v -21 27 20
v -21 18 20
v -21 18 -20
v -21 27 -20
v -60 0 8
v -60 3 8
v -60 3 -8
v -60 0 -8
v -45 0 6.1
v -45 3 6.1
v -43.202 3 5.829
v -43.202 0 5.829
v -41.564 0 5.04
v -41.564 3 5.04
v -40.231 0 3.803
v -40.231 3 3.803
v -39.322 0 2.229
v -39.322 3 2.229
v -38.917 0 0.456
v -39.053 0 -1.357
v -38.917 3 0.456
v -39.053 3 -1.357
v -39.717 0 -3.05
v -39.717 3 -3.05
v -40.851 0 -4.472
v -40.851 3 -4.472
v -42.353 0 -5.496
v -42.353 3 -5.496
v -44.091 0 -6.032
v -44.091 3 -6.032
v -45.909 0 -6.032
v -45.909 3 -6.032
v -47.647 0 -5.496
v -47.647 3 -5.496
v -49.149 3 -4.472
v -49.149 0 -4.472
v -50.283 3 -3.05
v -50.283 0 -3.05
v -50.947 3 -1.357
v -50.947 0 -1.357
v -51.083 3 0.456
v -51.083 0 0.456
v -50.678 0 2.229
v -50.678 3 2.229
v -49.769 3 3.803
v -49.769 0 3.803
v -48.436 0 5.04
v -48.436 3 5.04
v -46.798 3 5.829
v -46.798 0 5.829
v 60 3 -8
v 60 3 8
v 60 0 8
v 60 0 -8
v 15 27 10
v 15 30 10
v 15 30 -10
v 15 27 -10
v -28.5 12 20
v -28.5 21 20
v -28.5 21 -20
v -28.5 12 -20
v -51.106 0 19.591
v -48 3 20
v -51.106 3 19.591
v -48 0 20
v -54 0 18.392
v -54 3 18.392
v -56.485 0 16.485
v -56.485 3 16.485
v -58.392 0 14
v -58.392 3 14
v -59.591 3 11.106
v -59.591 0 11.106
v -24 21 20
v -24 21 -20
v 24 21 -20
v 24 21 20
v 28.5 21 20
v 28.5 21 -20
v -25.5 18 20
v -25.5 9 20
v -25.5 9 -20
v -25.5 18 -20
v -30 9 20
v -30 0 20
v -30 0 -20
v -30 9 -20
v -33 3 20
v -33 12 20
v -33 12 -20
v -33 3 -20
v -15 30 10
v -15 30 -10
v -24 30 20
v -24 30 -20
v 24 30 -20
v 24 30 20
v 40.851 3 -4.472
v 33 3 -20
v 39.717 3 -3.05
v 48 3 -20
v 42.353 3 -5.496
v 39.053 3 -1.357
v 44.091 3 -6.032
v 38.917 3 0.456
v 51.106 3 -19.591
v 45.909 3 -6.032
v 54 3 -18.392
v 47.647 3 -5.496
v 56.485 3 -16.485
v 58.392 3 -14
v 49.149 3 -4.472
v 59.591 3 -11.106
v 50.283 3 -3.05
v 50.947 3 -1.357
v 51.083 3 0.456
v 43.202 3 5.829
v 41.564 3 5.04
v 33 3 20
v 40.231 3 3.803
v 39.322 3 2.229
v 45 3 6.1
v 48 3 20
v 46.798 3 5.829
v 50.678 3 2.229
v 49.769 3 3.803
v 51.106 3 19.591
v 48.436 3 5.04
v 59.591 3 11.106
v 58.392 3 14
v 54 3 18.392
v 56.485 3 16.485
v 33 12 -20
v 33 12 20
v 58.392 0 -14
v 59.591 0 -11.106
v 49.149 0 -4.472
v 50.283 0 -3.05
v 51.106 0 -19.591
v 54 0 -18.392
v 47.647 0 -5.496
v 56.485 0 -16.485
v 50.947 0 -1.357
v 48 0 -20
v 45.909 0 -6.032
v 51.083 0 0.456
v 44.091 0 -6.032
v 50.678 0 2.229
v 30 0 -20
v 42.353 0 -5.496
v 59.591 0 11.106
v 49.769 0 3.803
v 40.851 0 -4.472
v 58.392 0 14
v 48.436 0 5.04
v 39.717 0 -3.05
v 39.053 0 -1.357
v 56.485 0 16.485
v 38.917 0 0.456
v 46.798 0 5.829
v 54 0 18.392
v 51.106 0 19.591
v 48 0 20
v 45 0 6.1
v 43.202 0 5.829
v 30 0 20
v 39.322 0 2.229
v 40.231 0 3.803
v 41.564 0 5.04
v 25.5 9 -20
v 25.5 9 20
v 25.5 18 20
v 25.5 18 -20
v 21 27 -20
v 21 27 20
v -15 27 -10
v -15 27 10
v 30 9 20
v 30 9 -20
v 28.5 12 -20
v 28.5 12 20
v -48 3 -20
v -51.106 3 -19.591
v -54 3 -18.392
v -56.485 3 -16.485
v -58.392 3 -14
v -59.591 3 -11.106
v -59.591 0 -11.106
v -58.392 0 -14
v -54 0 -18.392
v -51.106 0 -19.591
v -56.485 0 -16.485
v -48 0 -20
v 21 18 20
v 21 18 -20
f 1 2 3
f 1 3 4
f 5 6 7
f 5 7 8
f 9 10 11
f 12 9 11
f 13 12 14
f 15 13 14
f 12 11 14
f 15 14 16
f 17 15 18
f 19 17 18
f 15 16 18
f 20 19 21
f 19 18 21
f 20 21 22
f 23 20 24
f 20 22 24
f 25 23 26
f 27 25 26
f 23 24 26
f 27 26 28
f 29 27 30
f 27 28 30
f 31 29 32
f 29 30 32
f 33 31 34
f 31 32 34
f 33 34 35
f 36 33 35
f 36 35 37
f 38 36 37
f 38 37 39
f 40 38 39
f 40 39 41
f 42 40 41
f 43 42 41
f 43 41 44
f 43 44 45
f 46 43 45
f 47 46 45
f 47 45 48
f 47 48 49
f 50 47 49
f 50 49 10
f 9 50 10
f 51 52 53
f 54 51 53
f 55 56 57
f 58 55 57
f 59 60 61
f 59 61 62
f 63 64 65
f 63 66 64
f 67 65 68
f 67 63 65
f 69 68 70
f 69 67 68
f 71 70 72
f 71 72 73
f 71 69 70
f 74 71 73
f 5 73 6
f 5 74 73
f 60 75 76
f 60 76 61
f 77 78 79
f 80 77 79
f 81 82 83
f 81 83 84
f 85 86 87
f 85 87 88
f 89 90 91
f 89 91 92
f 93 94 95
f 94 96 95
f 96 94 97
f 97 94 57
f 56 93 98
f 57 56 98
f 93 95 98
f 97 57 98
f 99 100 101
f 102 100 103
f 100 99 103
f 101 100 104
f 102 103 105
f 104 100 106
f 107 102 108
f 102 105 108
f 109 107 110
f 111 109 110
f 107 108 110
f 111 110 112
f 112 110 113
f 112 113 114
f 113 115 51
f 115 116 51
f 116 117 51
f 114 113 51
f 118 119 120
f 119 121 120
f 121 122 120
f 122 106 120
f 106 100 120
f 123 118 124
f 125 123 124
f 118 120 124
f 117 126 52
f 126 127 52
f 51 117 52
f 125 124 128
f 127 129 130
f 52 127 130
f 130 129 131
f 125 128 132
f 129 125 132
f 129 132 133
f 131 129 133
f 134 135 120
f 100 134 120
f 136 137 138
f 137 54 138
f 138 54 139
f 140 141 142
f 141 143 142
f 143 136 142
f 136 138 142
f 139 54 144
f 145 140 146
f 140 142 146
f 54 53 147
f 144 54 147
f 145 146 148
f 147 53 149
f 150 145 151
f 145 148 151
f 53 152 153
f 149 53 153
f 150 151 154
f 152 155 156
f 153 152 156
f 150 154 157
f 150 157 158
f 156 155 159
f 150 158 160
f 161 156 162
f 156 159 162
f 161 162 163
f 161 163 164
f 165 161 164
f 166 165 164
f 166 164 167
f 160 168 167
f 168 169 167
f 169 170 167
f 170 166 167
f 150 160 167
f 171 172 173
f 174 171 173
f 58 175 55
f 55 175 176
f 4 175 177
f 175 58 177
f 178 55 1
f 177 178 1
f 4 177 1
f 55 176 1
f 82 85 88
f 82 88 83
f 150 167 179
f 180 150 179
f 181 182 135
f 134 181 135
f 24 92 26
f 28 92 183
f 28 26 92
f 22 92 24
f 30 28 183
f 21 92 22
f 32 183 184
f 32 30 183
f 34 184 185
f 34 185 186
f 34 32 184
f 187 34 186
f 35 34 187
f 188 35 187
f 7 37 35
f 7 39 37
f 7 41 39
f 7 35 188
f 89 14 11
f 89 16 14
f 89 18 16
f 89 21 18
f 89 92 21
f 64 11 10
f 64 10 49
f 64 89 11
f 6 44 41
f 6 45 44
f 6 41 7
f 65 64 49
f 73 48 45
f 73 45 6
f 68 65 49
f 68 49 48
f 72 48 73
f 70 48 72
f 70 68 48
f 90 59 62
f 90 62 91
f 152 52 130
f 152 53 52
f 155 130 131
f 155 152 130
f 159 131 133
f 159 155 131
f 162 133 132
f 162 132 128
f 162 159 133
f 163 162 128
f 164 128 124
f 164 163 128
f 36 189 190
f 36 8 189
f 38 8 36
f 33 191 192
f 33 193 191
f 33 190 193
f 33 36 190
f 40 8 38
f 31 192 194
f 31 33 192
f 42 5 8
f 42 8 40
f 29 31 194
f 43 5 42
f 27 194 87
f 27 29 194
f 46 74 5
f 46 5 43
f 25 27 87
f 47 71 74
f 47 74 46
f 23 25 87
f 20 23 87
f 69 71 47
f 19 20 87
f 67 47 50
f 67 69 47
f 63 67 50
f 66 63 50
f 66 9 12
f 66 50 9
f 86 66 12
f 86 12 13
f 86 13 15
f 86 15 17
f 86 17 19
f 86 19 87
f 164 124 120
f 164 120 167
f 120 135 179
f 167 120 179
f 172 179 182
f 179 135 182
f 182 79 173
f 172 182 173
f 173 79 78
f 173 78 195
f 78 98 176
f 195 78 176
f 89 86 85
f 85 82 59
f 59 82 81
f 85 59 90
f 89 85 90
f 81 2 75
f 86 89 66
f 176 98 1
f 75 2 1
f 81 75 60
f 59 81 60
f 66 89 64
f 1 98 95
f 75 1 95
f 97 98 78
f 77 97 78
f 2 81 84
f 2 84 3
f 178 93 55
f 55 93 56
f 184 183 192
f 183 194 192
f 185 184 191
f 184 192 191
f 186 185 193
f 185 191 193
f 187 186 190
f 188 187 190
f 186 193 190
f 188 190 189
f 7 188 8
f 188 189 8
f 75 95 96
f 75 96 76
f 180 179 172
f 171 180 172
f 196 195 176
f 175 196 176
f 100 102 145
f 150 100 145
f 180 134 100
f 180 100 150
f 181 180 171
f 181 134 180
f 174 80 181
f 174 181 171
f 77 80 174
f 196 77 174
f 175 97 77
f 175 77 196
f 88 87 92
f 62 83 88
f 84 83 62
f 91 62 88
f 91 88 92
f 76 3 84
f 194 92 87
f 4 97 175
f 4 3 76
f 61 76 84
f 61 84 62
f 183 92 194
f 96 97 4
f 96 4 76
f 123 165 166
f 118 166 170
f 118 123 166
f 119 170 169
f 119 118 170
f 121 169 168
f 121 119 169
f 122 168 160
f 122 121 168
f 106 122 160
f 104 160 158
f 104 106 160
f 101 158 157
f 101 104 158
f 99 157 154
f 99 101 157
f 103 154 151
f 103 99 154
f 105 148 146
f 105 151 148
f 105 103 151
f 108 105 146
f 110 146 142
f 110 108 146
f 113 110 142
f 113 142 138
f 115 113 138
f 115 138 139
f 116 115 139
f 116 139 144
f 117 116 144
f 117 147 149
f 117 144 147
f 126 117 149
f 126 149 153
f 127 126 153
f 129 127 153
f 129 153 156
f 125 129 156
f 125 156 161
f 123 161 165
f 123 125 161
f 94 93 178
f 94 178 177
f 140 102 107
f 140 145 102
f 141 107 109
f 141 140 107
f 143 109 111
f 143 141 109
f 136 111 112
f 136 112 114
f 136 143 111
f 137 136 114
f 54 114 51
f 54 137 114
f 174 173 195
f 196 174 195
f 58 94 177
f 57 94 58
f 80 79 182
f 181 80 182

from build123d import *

# Parameters (mm, degrees)
EXTRUDE_THIN1_DEPTH = 20
SKETCH2_W           = 30
SKETCH2_H           = 20
CUT_EXTRUDE1_DEPTH  = 71
SKETCH3_R           = 6.1
CUT_EXTRUDE2_DEPTH  = 69.767724988
FILLET1_R           = 12


with BuildPart() as part:
    # Sketch1 → Extrude-Thin1 (new, symmetric)
    with BuildSketch(Plane.XY):
        Polygon((-60, 0), (-30, 0), (-30, 9), (-25.5, 9), (-25.5, 18), (-21, 18), (-21, 27), (0, 27), (0, 30), (-24, 30), (-24, 21), (-28.5, 21), (-28.5, 12), (-33, 12), (-33, 3), (-60, 3), align=None)
    extrude_thin1 = extrude(amount=EXTRUDE_THIN1_DEPTH, both=True)

    # Mirror1: Extrude-Thin1 across plane
    add(extrude_thin1.mirror(Plane(origin=(0, 30, -20), x_dir=(0, 0, 1), z_dir=(-1, 0, 0))))

    # Sketch2 → Cut-Extrude1 (cut, through all)
    with BuildSketch(Plane(origin=(0, 30, 0), x_dir=(1, 0, 0), z_dir=(0, 1, 0))):
        Rectangle(SKETCH2_W, SKETCH2_H)
    extrude(amount=-CUT_EXTRUDE1_DEPTH, mode=Mode.SUBTRACT)

    # Sketch3 → Cut-Extrude2 (cut, through all)
    with BuildSketch(Plane(origin=(0, 3, 0), x_dir=(1, 0, 0), z_dir=(0, 1, 0))):
        with Locations(Location((-45, 0, 0), (0, 0, 270))):
            Circle(SKETCH3_R)
    cut_extrude2 = extrude(amount=-CUT_EXTRUDE2_DEPTH, mode=Mode.SUBTRACT)

    # Mirror2: Cut-Extrude2 across plane
    add(cut_extrude2.mirror(Plane(origin=(0, 0, 0), x_dir=(0, 0, 1), z_dir=(1, 0, 0))), mode=Mode.SUBTRACT)

    # Fillet1
    fillet1_edges = [part.edges().sort_by_distance(p)[0] for p in [
        (-60, 1.5, 20),
        (-60, 1.5, -20),
        (60, 1.5, -20),
        (60, 1.5, 20),
    ]]
    fillet(fillet1_edges, radius=FILLET1_R)


solid = part.part
